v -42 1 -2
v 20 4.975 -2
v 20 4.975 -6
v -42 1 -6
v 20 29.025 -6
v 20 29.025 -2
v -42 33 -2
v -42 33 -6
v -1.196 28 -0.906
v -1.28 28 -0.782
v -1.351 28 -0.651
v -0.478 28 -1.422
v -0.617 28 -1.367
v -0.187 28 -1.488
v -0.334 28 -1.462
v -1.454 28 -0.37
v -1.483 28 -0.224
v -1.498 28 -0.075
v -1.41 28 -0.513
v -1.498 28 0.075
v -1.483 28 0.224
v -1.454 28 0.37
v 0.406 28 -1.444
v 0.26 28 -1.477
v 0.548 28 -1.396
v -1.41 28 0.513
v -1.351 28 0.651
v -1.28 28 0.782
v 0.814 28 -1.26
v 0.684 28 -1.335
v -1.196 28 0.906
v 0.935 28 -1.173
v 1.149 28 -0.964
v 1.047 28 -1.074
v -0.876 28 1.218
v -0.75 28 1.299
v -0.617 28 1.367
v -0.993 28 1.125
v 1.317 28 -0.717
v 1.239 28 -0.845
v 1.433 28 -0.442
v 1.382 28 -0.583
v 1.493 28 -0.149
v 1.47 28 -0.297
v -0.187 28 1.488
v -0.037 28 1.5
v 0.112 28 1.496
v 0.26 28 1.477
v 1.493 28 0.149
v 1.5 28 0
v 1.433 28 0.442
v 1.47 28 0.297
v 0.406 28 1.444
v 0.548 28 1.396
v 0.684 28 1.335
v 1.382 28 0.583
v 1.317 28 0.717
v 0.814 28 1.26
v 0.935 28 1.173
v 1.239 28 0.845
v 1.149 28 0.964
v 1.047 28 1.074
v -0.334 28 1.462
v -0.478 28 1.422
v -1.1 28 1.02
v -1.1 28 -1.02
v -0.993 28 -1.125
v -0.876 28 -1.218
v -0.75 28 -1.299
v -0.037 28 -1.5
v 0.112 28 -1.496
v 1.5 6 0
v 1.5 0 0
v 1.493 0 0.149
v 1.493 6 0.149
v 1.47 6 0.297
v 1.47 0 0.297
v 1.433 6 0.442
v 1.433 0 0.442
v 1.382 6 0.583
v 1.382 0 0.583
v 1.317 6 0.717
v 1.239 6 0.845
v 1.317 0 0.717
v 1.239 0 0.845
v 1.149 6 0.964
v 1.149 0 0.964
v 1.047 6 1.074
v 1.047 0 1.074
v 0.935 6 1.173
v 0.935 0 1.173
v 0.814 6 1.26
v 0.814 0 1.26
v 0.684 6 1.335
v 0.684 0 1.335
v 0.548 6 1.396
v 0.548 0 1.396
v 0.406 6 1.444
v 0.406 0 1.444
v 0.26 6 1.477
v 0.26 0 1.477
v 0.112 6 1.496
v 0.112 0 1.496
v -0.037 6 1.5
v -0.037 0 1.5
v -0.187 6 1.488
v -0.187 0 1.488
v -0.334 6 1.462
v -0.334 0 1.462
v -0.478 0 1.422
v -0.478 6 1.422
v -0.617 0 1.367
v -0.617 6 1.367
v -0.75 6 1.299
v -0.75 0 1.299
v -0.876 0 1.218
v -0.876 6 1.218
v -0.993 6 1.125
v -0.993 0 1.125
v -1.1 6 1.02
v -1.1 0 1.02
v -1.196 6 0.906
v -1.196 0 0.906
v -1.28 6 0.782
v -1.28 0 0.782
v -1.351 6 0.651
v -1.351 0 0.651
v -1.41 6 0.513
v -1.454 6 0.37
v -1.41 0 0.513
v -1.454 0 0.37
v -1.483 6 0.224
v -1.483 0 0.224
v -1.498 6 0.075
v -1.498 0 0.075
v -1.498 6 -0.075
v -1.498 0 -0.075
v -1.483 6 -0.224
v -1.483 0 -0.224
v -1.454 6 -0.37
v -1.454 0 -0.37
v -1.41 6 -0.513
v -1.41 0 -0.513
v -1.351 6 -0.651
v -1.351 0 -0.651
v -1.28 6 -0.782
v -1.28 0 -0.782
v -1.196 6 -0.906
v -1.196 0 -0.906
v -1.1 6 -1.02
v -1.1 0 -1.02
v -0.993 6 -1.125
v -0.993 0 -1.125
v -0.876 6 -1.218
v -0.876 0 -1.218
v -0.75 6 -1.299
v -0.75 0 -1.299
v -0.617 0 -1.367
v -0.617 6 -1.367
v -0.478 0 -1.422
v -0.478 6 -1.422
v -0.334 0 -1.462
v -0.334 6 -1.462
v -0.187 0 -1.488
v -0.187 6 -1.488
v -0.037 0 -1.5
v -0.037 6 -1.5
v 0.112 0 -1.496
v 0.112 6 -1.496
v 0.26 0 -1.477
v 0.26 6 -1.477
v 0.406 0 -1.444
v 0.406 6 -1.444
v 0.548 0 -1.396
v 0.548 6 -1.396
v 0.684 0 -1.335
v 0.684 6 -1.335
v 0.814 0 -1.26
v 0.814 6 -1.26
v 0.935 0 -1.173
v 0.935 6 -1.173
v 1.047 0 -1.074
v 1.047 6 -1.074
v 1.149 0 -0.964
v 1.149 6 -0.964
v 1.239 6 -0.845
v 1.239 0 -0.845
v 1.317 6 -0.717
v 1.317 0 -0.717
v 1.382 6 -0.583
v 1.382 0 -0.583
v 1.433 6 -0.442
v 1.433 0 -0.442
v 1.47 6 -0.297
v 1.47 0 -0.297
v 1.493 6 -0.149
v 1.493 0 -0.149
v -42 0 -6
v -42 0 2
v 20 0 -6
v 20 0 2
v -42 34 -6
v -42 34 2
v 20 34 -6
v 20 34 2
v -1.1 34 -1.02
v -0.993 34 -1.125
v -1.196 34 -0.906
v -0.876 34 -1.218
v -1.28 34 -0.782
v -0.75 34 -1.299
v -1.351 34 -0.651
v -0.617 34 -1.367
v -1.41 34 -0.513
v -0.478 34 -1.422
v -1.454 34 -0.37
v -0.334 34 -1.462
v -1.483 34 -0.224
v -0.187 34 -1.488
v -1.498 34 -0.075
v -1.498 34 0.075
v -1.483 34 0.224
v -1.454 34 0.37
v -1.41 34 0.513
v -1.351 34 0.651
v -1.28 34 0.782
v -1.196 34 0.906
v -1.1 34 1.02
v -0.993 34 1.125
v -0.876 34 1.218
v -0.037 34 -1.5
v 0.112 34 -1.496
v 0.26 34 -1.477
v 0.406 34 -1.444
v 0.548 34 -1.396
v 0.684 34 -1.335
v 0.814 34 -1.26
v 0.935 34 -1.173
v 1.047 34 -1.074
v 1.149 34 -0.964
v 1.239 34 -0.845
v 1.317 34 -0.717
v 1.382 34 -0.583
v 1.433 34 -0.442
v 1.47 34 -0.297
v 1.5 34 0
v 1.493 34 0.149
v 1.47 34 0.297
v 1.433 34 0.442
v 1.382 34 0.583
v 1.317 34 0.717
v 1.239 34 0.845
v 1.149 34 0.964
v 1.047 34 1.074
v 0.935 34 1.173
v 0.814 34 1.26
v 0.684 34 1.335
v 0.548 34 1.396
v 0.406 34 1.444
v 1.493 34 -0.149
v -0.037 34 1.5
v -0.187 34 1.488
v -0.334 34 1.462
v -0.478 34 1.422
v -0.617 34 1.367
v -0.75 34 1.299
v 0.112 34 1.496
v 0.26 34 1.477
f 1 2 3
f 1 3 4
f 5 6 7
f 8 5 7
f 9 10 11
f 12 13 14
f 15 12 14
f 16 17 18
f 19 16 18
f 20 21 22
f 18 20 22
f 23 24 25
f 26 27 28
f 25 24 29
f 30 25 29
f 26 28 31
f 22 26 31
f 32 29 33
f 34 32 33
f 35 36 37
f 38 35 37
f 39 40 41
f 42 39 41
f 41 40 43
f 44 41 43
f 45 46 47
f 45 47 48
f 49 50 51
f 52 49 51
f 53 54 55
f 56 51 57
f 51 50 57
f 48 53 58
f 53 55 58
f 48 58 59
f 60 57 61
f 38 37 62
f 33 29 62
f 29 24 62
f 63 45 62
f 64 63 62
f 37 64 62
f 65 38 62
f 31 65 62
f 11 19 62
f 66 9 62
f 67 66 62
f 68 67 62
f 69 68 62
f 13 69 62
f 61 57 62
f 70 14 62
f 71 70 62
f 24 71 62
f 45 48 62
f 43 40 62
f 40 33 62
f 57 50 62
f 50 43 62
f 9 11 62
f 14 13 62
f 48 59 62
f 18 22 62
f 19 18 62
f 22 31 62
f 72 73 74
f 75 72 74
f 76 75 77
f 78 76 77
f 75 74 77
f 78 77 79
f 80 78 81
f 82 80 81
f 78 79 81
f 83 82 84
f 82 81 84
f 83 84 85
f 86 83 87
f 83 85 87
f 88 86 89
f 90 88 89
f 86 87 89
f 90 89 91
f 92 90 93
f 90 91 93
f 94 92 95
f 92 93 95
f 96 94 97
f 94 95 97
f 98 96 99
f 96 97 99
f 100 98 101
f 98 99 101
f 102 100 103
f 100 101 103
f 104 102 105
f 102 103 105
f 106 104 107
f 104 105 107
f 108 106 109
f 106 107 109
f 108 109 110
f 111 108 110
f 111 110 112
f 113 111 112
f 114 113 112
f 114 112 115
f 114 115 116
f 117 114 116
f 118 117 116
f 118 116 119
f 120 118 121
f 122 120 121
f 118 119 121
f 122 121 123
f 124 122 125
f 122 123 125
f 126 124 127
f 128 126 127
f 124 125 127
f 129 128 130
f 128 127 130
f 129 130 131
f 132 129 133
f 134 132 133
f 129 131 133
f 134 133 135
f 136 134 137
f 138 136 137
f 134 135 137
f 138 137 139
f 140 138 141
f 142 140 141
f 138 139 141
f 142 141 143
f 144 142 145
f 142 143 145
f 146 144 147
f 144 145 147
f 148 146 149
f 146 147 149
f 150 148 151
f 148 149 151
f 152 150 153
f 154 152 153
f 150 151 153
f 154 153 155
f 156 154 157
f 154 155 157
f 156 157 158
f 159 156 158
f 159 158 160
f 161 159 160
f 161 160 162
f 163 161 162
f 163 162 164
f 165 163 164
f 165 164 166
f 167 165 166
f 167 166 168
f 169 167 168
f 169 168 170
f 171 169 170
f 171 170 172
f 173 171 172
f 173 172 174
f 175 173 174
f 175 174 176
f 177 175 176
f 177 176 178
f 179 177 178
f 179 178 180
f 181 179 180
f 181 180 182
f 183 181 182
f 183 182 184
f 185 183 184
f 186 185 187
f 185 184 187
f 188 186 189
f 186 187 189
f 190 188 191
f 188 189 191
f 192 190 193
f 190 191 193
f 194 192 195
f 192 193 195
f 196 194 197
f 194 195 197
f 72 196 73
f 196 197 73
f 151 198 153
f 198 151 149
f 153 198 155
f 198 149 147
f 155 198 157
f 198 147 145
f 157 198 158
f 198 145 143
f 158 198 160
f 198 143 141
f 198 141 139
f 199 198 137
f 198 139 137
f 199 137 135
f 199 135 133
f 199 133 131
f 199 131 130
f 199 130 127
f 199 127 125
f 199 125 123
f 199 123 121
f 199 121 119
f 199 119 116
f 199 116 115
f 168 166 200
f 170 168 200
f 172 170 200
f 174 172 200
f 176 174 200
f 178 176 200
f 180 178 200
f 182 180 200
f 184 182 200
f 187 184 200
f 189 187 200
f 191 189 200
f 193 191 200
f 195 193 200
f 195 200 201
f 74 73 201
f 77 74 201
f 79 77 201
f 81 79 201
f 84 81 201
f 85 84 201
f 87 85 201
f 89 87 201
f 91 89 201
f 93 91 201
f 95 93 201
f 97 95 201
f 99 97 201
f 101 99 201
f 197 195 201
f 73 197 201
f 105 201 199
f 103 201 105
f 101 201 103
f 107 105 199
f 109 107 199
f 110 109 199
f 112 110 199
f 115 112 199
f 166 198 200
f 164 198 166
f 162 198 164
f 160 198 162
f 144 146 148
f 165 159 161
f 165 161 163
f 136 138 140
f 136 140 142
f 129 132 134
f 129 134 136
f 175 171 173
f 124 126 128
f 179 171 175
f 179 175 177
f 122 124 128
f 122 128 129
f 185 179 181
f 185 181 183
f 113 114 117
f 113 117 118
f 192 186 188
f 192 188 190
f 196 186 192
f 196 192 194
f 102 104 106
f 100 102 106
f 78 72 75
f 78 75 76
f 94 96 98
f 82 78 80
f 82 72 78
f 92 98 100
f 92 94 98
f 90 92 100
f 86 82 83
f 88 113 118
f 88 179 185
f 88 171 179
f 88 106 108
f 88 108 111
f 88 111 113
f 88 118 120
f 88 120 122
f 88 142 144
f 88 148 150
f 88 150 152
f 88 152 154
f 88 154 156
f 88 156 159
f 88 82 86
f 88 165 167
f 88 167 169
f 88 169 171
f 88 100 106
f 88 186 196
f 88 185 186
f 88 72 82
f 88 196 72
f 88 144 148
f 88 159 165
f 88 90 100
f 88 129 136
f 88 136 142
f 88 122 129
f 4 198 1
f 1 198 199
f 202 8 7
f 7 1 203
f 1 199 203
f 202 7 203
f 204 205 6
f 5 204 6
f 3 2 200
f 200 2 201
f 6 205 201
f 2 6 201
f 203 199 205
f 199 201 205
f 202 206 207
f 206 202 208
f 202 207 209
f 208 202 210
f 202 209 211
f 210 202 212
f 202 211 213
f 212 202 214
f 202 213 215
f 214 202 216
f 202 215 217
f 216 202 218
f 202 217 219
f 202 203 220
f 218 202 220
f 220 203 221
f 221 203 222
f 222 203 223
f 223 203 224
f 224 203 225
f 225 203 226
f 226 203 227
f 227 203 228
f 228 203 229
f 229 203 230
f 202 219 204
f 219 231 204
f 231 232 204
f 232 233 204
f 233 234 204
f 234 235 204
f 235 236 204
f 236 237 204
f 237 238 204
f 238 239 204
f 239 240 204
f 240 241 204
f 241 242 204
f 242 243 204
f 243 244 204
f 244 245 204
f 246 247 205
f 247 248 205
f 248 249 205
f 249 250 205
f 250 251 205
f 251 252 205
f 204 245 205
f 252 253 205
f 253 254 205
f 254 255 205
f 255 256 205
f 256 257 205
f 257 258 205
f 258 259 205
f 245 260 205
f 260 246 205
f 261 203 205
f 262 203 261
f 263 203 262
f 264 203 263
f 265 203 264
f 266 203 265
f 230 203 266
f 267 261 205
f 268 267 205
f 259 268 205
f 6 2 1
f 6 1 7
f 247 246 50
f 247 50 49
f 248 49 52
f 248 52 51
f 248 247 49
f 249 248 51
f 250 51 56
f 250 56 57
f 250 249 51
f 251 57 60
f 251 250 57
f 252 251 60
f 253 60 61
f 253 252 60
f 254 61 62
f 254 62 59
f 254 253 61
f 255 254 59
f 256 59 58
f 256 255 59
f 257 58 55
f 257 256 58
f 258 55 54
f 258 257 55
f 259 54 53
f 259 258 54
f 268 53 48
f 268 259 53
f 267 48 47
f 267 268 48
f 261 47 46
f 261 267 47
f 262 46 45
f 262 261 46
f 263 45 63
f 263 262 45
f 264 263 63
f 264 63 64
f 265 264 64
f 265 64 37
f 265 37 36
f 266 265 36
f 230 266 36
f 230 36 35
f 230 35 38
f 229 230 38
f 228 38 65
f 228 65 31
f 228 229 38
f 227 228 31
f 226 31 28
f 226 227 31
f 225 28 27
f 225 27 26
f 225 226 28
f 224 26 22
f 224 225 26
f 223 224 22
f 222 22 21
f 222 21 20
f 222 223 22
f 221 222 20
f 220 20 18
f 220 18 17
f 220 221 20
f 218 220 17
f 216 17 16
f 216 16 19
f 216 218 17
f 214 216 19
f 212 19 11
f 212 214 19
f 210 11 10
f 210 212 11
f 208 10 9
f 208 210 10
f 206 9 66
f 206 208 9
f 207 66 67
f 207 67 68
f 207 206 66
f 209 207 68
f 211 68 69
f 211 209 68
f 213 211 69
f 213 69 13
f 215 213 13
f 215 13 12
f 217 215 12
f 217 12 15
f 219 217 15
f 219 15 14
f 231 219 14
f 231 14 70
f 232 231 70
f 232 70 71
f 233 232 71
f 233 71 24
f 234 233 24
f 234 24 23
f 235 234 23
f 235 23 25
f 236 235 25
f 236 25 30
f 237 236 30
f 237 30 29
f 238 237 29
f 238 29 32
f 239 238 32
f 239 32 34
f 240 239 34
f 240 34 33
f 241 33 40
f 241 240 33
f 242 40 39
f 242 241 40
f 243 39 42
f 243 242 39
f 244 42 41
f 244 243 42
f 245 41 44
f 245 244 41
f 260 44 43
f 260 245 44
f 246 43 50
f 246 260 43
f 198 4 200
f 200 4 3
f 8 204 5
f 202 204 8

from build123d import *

# Parameters (mm, degrees)
SKETCH1_W           = 40
SKETCH1_H           = 4
BOSS_EXTRUDE1_DEPTH = 34
SKETCH2_R           = 1.5
CUT_EXTRUDE1_DEPTH  = 6
SKETCH3_W           = 4
SKETCH3_H           = 34
BOSS_EXTRUDE2_DEPTH = 22
BOSS_EXTRUDE3_DEPTH = 4


with BuildPart() as part:
    # Sketch1 → Boss-Extrude1 (new body)
    with BuildSketch(Plane(origin=(0, 0, 0), x_dir=(1, 0, 0), z_dir=(0, 1, 0))):
        Rectangle(SKETCH1_W, SKETCH1_H)
    extrude(amount=BOSS_EXTRUDE1_DEPTH)

    # Sketch2 → Cut-Extrude1 (cut)
    with BuildSketch(Plane.XZ):
        Circle(SKETCH2_R)
    cut_extrude1 = extrude(amount=-CUT_EXTRUDE1_DEPTH, mode=Mode.SUBTRACT)

    # Mirror1: Cut-Extrude1 across plane
    add(cut_extrude1.mirror(Plane(origin=(0, 17, 0), x_dir=(0, 0, 1), z_dir=(0, -1, 0))), mode=Mode.SUBTRACT)

    # Sketch3 → Boss-Extrude2 (add)
    with BuildSketch(Plane.ZY.offset(20)):
        with Locations((0, 17)):
            Rectangle(SKETCH3_W, SKETCH3_H)
    extrude(amount=BOSS_EXTRUDE2_DEPTH)

    # Sketch5 → Boss-Extrude3 (add)
    with BuildSketch(Plane(origin=(0, 0, -2), x_dir=(-1, 0, 0), z_dir=(0, 0, -1))):
        Polygon((-20, 29.024641929), (42, 33), (42, 34), (-20, 34), align=None)
        Polygon((42, 0), (-20, 0), (-20, 4.975358071), (42, 1), align=None)
    extrude(amount=BOSS_EXTRUDE3_DEPTH)


solid = part.part
